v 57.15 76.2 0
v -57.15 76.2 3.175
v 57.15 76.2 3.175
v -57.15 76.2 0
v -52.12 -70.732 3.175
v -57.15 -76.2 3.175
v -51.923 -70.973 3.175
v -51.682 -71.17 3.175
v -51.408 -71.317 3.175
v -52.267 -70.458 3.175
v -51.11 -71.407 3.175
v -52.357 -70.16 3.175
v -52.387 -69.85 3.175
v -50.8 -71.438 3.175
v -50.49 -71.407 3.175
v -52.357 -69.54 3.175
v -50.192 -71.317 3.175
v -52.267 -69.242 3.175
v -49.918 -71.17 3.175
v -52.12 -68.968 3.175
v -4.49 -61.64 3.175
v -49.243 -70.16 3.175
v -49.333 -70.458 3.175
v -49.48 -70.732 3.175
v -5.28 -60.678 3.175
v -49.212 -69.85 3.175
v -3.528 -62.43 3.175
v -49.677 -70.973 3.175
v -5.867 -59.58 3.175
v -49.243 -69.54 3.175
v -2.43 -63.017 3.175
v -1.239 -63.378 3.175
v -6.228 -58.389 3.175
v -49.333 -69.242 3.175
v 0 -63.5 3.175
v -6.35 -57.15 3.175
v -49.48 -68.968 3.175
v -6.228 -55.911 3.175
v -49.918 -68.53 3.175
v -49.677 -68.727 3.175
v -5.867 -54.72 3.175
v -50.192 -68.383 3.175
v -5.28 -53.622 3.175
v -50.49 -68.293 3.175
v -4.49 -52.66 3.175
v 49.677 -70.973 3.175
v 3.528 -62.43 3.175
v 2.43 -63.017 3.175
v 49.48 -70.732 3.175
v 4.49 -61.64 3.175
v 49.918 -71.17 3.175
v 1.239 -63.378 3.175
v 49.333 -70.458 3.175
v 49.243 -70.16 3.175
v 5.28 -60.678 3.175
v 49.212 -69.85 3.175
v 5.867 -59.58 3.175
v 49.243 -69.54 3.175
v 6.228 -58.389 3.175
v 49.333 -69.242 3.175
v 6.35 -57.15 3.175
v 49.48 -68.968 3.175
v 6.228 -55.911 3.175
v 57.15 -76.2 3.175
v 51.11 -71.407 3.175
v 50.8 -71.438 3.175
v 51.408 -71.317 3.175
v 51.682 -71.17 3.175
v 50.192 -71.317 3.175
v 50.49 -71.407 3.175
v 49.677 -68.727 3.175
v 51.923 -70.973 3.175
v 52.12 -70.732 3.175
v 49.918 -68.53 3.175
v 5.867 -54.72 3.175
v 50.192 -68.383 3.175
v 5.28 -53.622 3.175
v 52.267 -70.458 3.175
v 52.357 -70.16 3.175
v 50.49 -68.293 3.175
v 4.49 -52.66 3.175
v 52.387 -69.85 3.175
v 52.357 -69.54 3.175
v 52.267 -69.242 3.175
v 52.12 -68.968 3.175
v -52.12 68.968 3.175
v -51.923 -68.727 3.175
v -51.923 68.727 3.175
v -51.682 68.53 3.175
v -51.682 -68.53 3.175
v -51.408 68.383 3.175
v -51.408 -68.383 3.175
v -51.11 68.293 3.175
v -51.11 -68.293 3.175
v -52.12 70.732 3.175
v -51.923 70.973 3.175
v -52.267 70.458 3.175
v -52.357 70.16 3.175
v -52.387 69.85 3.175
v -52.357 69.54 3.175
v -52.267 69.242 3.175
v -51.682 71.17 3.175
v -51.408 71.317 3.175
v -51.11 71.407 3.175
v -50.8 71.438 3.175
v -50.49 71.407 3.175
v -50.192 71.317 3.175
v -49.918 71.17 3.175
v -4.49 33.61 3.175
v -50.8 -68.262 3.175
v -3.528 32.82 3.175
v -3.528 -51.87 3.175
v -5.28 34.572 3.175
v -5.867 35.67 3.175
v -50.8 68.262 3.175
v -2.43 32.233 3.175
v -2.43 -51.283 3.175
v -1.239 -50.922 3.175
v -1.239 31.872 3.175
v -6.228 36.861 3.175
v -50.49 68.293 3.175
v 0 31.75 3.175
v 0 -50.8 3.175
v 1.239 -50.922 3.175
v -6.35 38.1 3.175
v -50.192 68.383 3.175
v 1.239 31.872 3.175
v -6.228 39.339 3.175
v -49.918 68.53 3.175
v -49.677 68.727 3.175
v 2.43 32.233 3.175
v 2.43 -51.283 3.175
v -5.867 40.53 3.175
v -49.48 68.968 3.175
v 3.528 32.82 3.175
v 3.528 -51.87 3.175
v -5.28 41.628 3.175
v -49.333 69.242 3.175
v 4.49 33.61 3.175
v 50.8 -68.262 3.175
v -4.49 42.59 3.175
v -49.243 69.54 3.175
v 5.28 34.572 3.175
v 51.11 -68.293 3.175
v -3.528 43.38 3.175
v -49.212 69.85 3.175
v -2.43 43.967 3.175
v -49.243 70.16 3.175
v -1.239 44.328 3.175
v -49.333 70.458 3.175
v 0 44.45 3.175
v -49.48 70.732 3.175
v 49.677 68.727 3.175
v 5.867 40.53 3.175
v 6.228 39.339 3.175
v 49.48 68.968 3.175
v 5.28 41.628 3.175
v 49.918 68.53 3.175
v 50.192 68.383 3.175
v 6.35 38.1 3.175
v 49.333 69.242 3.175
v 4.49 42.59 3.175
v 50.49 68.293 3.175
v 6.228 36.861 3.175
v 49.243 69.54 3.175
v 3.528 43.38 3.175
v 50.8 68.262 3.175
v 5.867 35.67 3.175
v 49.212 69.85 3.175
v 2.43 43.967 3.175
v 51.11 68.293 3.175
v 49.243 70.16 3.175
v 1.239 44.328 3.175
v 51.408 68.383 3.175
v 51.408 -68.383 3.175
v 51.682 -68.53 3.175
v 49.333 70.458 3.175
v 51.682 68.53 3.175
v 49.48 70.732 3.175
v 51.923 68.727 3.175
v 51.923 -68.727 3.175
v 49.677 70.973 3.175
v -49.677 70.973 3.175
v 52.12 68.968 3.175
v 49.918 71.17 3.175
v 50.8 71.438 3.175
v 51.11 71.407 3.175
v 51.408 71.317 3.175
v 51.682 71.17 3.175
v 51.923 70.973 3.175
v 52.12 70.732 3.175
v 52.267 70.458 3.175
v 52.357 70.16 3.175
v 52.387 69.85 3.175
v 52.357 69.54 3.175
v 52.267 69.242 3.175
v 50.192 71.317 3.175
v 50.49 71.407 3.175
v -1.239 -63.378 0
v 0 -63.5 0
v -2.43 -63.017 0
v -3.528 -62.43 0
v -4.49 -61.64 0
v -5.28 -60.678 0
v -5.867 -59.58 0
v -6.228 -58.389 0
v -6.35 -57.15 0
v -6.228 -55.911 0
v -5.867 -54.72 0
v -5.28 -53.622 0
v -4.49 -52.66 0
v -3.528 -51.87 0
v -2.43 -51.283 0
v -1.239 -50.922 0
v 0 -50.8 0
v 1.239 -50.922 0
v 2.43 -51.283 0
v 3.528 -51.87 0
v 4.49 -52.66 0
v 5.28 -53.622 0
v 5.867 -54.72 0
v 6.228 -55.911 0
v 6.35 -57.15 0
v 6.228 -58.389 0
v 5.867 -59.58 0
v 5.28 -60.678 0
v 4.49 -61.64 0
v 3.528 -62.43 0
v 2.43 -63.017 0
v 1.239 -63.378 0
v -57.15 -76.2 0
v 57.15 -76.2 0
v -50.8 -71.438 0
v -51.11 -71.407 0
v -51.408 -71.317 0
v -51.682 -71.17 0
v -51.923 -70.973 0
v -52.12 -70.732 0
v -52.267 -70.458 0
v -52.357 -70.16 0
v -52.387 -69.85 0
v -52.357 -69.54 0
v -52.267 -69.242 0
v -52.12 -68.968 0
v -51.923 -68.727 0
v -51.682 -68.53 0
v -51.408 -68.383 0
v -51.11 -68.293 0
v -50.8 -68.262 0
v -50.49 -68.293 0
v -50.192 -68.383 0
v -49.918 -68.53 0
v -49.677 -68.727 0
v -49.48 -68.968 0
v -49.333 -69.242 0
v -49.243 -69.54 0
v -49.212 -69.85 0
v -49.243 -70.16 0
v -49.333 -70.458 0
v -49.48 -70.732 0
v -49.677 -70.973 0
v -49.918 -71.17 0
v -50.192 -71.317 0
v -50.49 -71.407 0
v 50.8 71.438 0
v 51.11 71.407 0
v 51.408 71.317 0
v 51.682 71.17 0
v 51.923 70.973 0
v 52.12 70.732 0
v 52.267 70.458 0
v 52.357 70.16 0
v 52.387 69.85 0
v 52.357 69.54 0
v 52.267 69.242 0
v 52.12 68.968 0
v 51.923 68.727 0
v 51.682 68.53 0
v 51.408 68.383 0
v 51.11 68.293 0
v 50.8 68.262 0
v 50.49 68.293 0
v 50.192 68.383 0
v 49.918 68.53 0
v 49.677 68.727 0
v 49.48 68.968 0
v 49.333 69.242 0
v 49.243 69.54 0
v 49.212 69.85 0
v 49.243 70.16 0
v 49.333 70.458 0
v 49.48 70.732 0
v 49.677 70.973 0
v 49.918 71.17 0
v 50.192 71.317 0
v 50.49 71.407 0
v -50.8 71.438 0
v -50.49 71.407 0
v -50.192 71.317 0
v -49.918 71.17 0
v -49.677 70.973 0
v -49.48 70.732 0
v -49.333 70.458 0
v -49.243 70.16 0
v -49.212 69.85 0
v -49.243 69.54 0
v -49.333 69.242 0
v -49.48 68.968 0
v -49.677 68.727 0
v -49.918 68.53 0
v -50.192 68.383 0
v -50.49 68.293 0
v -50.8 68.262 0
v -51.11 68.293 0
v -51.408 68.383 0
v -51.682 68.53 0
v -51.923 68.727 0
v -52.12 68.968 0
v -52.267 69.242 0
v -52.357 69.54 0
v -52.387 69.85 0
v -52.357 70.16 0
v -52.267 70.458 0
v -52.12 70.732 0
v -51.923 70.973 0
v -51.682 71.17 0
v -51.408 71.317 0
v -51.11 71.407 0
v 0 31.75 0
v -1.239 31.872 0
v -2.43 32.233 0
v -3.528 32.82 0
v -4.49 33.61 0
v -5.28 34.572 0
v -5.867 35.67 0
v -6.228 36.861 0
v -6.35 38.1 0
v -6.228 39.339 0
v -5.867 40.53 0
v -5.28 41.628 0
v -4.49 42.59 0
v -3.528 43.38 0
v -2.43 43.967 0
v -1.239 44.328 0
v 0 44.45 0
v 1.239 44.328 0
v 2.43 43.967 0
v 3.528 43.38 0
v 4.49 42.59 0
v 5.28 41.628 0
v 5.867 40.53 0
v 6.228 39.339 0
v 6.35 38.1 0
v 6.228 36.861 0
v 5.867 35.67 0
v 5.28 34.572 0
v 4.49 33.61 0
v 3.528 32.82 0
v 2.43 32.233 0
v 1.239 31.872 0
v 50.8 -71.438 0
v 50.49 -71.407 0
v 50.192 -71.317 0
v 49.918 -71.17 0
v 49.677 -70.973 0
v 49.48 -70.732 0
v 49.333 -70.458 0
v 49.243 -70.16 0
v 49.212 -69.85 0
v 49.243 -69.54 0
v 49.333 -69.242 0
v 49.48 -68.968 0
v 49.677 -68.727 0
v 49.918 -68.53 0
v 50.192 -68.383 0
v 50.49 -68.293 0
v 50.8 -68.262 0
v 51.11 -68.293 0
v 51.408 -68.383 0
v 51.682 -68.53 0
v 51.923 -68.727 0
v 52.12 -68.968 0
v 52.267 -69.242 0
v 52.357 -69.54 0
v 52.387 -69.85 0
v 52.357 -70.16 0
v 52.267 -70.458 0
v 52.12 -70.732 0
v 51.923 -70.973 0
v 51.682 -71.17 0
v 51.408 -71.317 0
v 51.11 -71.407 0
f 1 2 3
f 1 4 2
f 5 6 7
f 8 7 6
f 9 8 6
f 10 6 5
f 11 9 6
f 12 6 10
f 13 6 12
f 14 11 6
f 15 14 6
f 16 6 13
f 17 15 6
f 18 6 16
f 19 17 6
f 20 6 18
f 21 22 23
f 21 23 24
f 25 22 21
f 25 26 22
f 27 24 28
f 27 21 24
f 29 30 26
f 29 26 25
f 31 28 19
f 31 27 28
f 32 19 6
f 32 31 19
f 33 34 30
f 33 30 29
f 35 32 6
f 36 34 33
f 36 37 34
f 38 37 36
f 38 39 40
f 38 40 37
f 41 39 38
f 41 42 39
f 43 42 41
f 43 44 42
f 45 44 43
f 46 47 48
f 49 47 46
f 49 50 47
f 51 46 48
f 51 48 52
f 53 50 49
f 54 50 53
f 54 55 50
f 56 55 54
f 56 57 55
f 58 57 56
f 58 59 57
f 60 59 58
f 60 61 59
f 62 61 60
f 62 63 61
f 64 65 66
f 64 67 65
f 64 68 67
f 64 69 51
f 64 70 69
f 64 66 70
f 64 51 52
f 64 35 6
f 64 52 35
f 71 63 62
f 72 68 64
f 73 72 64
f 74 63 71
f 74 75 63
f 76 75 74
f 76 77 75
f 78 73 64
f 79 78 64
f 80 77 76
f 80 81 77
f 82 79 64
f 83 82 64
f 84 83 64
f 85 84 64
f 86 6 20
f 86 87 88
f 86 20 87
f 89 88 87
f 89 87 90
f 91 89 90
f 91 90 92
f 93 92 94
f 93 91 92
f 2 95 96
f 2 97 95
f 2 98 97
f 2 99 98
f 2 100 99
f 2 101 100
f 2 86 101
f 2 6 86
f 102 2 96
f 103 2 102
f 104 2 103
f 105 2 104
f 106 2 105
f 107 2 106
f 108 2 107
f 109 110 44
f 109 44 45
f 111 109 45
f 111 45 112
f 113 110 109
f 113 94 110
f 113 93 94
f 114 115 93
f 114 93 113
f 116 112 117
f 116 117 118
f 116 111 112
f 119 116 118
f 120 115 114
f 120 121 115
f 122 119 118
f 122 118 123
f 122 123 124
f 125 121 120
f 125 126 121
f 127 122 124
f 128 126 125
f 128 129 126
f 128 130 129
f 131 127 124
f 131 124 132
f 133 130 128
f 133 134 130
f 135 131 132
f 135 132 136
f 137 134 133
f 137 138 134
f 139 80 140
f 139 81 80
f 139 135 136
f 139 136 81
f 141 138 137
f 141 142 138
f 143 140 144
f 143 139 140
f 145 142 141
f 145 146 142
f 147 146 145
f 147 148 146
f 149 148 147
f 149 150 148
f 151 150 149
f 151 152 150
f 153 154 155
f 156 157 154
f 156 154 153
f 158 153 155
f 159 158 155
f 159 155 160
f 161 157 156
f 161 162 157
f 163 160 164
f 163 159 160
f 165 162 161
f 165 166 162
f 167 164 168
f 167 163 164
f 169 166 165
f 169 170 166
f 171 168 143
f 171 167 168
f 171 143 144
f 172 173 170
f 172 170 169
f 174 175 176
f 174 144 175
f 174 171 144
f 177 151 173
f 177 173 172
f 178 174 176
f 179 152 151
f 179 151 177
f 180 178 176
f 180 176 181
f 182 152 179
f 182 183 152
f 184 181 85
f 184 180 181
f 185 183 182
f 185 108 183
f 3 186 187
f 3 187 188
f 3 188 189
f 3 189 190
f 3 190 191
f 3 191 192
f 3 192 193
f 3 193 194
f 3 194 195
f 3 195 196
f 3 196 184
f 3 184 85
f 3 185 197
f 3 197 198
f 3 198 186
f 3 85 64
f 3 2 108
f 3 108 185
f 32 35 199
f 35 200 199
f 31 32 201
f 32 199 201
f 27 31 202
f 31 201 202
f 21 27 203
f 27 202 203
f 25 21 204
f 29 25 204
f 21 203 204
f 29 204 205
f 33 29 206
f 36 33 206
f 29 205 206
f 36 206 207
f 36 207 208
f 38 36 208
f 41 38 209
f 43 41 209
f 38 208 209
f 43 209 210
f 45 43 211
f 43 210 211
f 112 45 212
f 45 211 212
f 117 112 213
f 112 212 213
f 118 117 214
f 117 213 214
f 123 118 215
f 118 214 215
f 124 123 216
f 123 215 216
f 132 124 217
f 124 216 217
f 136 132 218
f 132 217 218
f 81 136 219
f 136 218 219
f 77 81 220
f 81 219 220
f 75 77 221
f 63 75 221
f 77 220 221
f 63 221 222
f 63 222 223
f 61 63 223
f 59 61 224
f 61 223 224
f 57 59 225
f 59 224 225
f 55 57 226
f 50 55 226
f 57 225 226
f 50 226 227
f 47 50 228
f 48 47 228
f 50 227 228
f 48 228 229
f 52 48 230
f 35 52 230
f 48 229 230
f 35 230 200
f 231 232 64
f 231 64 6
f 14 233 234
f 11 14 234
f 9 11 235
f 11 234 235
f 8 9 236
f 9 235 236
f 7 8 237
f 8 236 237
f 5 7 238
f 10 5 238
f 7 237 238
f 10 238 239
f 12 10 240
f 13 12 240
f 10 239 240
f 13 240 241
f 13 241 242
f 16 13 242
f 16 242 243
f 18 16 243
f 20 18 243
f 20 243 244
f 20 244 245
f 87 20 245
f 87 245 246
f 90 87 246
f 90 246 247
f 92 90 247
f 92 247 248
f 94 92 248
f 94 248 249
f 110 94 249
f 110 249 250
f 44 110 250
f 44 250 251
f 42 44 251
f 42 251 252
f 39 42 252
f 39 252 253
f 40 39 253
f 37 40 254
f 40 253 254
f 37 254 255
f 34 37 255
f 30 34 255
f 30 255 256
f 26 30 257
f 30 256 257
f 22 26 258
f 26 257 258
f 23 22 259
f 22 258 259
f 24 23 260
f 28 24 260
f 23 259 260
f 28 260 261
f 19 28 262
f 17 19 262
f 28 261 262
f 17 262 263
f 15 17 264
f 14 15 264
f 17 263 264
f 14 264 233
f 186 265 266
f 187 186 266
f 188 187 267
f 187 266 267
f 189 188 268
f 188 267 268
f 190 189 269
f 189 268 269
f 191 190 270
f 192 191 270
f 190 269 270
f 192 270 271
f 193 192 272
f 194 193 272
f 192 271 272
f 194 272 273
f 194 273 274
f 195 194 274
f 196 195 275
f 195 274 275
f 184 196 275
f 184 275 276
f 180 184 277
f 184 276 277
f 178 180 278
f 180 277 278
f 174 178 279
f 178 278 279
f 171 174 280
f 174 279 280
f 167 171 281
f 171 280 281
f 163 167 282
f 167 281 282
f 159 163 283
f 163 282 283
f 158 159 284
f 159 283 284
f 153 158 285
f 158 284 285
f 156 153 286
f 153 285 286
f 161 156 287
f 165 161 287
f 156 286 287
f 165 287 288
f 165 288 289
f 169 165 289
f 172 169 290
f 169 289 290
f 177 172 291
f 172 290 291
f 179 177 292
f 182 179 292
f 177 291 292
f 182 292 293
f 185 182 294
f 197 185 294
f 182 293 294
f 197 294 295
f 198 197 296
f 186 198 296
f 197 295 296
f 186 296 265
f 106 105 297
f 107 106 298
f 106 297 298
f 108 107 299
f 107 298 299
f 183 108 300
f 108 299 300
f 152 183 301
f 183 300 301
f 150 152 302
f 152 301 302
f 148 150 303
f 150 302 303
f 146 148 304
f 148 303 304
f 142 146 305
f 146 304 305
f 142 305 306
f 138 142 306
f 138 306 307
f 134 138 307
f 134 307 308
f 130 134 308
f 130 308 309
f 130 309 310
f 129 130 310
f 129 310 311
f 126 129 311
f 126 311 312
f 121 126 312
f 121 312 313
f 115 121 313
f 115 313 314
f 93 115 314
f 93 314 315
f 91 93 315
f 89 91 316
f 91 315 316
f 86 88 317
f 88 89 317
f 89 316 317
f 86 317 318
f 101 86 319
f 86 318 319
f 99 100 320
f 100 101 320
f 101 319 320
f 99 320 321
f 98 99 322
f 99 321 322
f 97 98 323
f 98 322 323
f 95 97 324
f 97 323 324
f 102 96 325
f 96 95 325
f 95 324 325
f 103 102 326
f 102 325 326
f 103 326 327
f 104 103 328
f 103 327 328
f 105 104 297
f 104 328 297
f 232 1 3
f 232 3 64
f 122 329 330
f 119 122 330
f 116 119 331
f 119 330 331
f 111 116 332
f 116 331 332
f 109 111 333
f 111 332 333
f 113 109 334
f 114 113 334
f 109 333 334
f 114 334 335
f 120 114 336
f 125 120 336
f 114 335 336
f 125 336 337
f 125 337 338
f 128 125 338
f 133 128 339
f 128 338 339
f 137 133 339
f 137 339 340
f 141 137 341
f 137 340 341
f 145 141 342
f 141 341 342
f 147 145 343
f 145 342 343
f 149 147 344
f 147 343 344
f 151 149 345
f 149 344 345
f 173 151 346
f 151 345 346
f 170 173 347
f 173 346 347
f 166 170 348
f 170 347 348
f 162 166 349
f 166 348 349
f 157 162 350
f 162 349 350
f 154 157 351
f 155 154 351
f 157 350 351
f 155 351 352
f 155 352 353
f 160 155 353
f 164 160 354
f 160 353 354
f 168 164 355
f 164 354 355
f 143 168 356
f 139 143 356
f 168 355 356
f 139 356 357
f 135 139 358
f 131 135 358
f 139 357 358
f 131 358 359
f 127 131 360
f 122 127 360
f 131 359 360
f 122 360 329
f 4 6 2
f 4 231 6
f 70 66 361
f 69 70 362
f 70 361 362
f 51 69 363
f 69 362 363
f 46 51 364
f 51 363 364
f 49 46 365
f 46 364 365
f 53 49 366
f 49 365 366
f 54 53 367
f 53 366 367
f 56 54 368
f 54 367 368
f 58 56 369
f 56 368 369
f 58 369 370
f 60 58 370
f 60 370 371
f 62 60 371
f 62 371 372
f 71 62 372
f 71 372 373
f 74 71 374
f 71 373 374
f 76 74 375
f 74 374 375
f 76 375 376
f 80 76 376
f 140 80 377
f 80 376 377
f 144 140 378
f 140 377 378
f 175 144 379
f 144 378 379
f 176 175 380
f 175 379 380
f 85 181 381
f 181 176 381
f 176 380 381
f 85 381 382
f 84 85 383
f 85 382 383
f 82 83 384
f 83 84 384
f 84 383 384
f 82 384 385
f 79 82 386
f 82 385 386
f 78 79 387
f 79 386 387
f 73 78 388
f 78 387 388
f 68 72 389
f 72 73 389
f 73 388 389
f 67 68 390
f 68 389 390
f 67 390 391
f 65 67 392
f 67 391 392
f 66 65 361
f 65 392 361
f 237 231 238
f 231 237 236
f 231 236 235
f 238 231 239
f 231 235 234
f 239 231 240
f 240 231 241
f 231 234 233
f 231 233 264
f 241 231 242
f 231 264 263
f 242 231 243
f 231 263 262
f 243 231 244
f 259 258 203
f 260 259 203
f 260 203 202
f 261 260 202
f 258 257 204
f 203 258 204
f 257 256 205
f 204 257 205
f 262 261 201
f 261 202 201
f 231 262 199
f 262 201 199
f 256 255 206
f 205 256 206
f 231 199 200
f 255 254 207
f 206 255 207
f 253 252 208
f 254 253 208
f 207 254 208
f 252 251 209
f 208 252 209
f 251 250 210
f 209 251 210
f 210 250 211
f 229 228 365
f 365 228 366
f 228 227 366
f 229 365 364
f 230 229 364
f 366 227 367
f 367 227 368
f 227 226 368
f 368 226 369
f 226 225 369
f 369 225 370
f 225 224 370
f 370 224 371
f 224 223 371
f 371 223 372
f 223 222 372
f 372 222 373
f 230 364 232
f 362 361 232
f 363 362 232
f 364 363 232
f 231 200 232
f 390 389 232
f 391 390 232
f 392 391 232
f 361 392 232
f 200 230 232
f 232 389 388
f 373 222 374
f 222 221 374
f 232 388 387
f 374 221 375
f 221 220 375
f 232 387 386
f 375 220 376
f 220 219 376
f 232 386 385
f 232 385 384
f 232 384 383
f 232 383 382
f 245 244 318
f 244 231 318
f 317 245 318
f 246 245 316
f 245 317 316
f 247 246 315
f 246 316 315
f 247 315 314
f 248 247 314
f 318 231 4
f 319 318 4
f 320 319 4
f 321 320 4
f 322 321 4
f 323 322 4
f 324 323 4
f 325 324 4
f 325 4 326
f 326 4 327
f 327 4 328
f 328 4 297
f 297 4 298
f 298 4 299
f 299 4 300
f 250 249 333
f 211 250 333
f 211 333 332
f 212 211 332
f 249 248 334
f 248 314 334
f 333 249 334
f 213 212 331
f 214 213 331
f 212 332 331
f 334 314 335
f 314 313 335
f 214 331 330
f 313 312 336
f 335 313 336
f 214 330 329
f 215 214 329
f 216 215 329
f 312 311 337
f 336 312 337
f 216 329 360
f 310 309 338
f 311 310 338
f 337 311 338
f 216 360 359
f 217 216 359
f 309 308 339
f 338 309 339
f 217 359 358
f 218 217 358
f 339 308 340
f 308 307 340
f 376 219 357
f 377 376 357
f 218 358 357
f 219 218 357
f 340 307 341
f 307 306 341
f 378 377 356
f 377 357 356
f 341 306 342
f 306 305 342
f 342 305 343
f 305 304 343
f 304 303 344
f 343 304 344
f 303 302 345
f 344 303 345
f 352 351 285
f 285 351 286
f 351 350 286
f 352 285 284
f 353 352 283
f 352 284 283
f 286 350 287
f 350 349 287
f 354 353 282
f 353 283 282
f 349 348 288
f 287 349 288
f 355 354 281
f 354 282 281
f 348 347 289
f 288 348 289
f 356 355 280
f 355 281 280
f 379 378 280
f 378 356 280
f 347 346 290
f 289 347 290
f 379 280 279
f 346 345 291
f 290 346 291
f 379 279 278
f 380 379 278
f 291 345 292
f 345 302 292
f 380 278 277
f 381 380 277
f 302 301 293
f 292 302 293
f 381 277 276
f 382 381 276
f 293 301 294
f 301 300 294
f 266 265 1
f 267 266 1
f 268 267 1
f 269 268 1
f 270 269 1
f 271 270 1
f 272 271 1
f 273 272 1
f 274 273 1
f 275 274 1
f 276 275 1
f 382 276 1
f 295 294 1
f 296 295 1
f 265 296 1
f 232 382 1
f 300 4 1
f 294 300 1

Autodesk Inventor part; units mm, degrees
ref_plane "YZ Plane" through (0, 0, 0) normal (1, 0, 0) x (0, 1, 0)
ref_plane "XZ Plane" through (0, 0, 0) normal (0, 1, 0) x (-1, 0, 0)
ref_plane "XY Plane" through (0, 0, 0) normal (0, 0, 1) x (1, 0, 0)
sketch "Sketch1" plane through (0, 0, 0) normal (0, 0, 1) x (1, 0, 0)
  line L0 (0, 0) -> (0, 40.5449) construction
  line L1 (0, 0) -> (42.3786, 0) construction
  line L2 (-57.15, 76.2) -> (57.15, 76.2)
  line L3 (57.15, 76.2) -> (57.15, -76.2)
  line L4 (57.15, -76.2) -> (-57.15, -76.2)
  line L5 (-57.15, -76.2) -> (-57.15, 76.2)
  dimension "d0" = 152.4
  dimension "d1" = 114.3
extrude "Extrusion1" add sketch "Sketch1" along normal blind 3.175
sketch "Sketch2" plane through (0, 0, 3.175) normal (0, 0, 1) x (1, 0, 0)
  line L0 (57.15, 76.2) -> (-57.15, 76.2) projected
  line L1 (-57.15, 76.2) -> (-57.15, -76.2) projected
  point P0 (0, 0)
  point P1 (0, 38.1)
  dimension "d4" = 38.1
  dimension "d5" = 57.15
hole "Hole1" at (0, 38.1, 3.175) direction (0, 0, -1) diameter 12.7 end through all
sketch "Sketch3" plane through (0, 0, 3.175) normal (0, 0, 1) x (1, 0, 0)
  line L0 (-57.15, -76.2) -> (57.15, -76.2) projected
  line L1 (-57.15, 76.2) -> (-57.15, -76.2) projected
  point P0 (0, 0)
  point P1 (-50.8, -69.85)
  dimension "d13" = 6.35
  dimension "d14" = 6.35
hole "Hole2" at (-50.8, -69.85, 3.175) direction (0, 0, -1) diameter 3.175 end through all
mirror "Mirror1" about plane through (0, 0, 0) normal (1, 0, 0) of "Hole2"
mirror "Mirror2" about plane through (0, 0, 0) normal (0, 1, 0) of "Hole2", "Mirror1"
sketch "Sketch4" plane through (0, 0, 3.175) normal (0, 0, 1) x (1, 0, 0)
  line L0 (-57.15, -76.2) -> (57.15, -76.2) projected
  line L1 (-57.15, 76.2) -> (-57.15, -76.2) projected
  point P0 (0, 0)
  point P1 (0, -57.15)
  dimension "d22" = 19.05
  dimension "d23" = 57.15
hole "Hole3" at (0, -57.15, 3.175) direction (0, 0, -1) diameter 12.7 end through all
properties part number "GearBoxRearPlate"
